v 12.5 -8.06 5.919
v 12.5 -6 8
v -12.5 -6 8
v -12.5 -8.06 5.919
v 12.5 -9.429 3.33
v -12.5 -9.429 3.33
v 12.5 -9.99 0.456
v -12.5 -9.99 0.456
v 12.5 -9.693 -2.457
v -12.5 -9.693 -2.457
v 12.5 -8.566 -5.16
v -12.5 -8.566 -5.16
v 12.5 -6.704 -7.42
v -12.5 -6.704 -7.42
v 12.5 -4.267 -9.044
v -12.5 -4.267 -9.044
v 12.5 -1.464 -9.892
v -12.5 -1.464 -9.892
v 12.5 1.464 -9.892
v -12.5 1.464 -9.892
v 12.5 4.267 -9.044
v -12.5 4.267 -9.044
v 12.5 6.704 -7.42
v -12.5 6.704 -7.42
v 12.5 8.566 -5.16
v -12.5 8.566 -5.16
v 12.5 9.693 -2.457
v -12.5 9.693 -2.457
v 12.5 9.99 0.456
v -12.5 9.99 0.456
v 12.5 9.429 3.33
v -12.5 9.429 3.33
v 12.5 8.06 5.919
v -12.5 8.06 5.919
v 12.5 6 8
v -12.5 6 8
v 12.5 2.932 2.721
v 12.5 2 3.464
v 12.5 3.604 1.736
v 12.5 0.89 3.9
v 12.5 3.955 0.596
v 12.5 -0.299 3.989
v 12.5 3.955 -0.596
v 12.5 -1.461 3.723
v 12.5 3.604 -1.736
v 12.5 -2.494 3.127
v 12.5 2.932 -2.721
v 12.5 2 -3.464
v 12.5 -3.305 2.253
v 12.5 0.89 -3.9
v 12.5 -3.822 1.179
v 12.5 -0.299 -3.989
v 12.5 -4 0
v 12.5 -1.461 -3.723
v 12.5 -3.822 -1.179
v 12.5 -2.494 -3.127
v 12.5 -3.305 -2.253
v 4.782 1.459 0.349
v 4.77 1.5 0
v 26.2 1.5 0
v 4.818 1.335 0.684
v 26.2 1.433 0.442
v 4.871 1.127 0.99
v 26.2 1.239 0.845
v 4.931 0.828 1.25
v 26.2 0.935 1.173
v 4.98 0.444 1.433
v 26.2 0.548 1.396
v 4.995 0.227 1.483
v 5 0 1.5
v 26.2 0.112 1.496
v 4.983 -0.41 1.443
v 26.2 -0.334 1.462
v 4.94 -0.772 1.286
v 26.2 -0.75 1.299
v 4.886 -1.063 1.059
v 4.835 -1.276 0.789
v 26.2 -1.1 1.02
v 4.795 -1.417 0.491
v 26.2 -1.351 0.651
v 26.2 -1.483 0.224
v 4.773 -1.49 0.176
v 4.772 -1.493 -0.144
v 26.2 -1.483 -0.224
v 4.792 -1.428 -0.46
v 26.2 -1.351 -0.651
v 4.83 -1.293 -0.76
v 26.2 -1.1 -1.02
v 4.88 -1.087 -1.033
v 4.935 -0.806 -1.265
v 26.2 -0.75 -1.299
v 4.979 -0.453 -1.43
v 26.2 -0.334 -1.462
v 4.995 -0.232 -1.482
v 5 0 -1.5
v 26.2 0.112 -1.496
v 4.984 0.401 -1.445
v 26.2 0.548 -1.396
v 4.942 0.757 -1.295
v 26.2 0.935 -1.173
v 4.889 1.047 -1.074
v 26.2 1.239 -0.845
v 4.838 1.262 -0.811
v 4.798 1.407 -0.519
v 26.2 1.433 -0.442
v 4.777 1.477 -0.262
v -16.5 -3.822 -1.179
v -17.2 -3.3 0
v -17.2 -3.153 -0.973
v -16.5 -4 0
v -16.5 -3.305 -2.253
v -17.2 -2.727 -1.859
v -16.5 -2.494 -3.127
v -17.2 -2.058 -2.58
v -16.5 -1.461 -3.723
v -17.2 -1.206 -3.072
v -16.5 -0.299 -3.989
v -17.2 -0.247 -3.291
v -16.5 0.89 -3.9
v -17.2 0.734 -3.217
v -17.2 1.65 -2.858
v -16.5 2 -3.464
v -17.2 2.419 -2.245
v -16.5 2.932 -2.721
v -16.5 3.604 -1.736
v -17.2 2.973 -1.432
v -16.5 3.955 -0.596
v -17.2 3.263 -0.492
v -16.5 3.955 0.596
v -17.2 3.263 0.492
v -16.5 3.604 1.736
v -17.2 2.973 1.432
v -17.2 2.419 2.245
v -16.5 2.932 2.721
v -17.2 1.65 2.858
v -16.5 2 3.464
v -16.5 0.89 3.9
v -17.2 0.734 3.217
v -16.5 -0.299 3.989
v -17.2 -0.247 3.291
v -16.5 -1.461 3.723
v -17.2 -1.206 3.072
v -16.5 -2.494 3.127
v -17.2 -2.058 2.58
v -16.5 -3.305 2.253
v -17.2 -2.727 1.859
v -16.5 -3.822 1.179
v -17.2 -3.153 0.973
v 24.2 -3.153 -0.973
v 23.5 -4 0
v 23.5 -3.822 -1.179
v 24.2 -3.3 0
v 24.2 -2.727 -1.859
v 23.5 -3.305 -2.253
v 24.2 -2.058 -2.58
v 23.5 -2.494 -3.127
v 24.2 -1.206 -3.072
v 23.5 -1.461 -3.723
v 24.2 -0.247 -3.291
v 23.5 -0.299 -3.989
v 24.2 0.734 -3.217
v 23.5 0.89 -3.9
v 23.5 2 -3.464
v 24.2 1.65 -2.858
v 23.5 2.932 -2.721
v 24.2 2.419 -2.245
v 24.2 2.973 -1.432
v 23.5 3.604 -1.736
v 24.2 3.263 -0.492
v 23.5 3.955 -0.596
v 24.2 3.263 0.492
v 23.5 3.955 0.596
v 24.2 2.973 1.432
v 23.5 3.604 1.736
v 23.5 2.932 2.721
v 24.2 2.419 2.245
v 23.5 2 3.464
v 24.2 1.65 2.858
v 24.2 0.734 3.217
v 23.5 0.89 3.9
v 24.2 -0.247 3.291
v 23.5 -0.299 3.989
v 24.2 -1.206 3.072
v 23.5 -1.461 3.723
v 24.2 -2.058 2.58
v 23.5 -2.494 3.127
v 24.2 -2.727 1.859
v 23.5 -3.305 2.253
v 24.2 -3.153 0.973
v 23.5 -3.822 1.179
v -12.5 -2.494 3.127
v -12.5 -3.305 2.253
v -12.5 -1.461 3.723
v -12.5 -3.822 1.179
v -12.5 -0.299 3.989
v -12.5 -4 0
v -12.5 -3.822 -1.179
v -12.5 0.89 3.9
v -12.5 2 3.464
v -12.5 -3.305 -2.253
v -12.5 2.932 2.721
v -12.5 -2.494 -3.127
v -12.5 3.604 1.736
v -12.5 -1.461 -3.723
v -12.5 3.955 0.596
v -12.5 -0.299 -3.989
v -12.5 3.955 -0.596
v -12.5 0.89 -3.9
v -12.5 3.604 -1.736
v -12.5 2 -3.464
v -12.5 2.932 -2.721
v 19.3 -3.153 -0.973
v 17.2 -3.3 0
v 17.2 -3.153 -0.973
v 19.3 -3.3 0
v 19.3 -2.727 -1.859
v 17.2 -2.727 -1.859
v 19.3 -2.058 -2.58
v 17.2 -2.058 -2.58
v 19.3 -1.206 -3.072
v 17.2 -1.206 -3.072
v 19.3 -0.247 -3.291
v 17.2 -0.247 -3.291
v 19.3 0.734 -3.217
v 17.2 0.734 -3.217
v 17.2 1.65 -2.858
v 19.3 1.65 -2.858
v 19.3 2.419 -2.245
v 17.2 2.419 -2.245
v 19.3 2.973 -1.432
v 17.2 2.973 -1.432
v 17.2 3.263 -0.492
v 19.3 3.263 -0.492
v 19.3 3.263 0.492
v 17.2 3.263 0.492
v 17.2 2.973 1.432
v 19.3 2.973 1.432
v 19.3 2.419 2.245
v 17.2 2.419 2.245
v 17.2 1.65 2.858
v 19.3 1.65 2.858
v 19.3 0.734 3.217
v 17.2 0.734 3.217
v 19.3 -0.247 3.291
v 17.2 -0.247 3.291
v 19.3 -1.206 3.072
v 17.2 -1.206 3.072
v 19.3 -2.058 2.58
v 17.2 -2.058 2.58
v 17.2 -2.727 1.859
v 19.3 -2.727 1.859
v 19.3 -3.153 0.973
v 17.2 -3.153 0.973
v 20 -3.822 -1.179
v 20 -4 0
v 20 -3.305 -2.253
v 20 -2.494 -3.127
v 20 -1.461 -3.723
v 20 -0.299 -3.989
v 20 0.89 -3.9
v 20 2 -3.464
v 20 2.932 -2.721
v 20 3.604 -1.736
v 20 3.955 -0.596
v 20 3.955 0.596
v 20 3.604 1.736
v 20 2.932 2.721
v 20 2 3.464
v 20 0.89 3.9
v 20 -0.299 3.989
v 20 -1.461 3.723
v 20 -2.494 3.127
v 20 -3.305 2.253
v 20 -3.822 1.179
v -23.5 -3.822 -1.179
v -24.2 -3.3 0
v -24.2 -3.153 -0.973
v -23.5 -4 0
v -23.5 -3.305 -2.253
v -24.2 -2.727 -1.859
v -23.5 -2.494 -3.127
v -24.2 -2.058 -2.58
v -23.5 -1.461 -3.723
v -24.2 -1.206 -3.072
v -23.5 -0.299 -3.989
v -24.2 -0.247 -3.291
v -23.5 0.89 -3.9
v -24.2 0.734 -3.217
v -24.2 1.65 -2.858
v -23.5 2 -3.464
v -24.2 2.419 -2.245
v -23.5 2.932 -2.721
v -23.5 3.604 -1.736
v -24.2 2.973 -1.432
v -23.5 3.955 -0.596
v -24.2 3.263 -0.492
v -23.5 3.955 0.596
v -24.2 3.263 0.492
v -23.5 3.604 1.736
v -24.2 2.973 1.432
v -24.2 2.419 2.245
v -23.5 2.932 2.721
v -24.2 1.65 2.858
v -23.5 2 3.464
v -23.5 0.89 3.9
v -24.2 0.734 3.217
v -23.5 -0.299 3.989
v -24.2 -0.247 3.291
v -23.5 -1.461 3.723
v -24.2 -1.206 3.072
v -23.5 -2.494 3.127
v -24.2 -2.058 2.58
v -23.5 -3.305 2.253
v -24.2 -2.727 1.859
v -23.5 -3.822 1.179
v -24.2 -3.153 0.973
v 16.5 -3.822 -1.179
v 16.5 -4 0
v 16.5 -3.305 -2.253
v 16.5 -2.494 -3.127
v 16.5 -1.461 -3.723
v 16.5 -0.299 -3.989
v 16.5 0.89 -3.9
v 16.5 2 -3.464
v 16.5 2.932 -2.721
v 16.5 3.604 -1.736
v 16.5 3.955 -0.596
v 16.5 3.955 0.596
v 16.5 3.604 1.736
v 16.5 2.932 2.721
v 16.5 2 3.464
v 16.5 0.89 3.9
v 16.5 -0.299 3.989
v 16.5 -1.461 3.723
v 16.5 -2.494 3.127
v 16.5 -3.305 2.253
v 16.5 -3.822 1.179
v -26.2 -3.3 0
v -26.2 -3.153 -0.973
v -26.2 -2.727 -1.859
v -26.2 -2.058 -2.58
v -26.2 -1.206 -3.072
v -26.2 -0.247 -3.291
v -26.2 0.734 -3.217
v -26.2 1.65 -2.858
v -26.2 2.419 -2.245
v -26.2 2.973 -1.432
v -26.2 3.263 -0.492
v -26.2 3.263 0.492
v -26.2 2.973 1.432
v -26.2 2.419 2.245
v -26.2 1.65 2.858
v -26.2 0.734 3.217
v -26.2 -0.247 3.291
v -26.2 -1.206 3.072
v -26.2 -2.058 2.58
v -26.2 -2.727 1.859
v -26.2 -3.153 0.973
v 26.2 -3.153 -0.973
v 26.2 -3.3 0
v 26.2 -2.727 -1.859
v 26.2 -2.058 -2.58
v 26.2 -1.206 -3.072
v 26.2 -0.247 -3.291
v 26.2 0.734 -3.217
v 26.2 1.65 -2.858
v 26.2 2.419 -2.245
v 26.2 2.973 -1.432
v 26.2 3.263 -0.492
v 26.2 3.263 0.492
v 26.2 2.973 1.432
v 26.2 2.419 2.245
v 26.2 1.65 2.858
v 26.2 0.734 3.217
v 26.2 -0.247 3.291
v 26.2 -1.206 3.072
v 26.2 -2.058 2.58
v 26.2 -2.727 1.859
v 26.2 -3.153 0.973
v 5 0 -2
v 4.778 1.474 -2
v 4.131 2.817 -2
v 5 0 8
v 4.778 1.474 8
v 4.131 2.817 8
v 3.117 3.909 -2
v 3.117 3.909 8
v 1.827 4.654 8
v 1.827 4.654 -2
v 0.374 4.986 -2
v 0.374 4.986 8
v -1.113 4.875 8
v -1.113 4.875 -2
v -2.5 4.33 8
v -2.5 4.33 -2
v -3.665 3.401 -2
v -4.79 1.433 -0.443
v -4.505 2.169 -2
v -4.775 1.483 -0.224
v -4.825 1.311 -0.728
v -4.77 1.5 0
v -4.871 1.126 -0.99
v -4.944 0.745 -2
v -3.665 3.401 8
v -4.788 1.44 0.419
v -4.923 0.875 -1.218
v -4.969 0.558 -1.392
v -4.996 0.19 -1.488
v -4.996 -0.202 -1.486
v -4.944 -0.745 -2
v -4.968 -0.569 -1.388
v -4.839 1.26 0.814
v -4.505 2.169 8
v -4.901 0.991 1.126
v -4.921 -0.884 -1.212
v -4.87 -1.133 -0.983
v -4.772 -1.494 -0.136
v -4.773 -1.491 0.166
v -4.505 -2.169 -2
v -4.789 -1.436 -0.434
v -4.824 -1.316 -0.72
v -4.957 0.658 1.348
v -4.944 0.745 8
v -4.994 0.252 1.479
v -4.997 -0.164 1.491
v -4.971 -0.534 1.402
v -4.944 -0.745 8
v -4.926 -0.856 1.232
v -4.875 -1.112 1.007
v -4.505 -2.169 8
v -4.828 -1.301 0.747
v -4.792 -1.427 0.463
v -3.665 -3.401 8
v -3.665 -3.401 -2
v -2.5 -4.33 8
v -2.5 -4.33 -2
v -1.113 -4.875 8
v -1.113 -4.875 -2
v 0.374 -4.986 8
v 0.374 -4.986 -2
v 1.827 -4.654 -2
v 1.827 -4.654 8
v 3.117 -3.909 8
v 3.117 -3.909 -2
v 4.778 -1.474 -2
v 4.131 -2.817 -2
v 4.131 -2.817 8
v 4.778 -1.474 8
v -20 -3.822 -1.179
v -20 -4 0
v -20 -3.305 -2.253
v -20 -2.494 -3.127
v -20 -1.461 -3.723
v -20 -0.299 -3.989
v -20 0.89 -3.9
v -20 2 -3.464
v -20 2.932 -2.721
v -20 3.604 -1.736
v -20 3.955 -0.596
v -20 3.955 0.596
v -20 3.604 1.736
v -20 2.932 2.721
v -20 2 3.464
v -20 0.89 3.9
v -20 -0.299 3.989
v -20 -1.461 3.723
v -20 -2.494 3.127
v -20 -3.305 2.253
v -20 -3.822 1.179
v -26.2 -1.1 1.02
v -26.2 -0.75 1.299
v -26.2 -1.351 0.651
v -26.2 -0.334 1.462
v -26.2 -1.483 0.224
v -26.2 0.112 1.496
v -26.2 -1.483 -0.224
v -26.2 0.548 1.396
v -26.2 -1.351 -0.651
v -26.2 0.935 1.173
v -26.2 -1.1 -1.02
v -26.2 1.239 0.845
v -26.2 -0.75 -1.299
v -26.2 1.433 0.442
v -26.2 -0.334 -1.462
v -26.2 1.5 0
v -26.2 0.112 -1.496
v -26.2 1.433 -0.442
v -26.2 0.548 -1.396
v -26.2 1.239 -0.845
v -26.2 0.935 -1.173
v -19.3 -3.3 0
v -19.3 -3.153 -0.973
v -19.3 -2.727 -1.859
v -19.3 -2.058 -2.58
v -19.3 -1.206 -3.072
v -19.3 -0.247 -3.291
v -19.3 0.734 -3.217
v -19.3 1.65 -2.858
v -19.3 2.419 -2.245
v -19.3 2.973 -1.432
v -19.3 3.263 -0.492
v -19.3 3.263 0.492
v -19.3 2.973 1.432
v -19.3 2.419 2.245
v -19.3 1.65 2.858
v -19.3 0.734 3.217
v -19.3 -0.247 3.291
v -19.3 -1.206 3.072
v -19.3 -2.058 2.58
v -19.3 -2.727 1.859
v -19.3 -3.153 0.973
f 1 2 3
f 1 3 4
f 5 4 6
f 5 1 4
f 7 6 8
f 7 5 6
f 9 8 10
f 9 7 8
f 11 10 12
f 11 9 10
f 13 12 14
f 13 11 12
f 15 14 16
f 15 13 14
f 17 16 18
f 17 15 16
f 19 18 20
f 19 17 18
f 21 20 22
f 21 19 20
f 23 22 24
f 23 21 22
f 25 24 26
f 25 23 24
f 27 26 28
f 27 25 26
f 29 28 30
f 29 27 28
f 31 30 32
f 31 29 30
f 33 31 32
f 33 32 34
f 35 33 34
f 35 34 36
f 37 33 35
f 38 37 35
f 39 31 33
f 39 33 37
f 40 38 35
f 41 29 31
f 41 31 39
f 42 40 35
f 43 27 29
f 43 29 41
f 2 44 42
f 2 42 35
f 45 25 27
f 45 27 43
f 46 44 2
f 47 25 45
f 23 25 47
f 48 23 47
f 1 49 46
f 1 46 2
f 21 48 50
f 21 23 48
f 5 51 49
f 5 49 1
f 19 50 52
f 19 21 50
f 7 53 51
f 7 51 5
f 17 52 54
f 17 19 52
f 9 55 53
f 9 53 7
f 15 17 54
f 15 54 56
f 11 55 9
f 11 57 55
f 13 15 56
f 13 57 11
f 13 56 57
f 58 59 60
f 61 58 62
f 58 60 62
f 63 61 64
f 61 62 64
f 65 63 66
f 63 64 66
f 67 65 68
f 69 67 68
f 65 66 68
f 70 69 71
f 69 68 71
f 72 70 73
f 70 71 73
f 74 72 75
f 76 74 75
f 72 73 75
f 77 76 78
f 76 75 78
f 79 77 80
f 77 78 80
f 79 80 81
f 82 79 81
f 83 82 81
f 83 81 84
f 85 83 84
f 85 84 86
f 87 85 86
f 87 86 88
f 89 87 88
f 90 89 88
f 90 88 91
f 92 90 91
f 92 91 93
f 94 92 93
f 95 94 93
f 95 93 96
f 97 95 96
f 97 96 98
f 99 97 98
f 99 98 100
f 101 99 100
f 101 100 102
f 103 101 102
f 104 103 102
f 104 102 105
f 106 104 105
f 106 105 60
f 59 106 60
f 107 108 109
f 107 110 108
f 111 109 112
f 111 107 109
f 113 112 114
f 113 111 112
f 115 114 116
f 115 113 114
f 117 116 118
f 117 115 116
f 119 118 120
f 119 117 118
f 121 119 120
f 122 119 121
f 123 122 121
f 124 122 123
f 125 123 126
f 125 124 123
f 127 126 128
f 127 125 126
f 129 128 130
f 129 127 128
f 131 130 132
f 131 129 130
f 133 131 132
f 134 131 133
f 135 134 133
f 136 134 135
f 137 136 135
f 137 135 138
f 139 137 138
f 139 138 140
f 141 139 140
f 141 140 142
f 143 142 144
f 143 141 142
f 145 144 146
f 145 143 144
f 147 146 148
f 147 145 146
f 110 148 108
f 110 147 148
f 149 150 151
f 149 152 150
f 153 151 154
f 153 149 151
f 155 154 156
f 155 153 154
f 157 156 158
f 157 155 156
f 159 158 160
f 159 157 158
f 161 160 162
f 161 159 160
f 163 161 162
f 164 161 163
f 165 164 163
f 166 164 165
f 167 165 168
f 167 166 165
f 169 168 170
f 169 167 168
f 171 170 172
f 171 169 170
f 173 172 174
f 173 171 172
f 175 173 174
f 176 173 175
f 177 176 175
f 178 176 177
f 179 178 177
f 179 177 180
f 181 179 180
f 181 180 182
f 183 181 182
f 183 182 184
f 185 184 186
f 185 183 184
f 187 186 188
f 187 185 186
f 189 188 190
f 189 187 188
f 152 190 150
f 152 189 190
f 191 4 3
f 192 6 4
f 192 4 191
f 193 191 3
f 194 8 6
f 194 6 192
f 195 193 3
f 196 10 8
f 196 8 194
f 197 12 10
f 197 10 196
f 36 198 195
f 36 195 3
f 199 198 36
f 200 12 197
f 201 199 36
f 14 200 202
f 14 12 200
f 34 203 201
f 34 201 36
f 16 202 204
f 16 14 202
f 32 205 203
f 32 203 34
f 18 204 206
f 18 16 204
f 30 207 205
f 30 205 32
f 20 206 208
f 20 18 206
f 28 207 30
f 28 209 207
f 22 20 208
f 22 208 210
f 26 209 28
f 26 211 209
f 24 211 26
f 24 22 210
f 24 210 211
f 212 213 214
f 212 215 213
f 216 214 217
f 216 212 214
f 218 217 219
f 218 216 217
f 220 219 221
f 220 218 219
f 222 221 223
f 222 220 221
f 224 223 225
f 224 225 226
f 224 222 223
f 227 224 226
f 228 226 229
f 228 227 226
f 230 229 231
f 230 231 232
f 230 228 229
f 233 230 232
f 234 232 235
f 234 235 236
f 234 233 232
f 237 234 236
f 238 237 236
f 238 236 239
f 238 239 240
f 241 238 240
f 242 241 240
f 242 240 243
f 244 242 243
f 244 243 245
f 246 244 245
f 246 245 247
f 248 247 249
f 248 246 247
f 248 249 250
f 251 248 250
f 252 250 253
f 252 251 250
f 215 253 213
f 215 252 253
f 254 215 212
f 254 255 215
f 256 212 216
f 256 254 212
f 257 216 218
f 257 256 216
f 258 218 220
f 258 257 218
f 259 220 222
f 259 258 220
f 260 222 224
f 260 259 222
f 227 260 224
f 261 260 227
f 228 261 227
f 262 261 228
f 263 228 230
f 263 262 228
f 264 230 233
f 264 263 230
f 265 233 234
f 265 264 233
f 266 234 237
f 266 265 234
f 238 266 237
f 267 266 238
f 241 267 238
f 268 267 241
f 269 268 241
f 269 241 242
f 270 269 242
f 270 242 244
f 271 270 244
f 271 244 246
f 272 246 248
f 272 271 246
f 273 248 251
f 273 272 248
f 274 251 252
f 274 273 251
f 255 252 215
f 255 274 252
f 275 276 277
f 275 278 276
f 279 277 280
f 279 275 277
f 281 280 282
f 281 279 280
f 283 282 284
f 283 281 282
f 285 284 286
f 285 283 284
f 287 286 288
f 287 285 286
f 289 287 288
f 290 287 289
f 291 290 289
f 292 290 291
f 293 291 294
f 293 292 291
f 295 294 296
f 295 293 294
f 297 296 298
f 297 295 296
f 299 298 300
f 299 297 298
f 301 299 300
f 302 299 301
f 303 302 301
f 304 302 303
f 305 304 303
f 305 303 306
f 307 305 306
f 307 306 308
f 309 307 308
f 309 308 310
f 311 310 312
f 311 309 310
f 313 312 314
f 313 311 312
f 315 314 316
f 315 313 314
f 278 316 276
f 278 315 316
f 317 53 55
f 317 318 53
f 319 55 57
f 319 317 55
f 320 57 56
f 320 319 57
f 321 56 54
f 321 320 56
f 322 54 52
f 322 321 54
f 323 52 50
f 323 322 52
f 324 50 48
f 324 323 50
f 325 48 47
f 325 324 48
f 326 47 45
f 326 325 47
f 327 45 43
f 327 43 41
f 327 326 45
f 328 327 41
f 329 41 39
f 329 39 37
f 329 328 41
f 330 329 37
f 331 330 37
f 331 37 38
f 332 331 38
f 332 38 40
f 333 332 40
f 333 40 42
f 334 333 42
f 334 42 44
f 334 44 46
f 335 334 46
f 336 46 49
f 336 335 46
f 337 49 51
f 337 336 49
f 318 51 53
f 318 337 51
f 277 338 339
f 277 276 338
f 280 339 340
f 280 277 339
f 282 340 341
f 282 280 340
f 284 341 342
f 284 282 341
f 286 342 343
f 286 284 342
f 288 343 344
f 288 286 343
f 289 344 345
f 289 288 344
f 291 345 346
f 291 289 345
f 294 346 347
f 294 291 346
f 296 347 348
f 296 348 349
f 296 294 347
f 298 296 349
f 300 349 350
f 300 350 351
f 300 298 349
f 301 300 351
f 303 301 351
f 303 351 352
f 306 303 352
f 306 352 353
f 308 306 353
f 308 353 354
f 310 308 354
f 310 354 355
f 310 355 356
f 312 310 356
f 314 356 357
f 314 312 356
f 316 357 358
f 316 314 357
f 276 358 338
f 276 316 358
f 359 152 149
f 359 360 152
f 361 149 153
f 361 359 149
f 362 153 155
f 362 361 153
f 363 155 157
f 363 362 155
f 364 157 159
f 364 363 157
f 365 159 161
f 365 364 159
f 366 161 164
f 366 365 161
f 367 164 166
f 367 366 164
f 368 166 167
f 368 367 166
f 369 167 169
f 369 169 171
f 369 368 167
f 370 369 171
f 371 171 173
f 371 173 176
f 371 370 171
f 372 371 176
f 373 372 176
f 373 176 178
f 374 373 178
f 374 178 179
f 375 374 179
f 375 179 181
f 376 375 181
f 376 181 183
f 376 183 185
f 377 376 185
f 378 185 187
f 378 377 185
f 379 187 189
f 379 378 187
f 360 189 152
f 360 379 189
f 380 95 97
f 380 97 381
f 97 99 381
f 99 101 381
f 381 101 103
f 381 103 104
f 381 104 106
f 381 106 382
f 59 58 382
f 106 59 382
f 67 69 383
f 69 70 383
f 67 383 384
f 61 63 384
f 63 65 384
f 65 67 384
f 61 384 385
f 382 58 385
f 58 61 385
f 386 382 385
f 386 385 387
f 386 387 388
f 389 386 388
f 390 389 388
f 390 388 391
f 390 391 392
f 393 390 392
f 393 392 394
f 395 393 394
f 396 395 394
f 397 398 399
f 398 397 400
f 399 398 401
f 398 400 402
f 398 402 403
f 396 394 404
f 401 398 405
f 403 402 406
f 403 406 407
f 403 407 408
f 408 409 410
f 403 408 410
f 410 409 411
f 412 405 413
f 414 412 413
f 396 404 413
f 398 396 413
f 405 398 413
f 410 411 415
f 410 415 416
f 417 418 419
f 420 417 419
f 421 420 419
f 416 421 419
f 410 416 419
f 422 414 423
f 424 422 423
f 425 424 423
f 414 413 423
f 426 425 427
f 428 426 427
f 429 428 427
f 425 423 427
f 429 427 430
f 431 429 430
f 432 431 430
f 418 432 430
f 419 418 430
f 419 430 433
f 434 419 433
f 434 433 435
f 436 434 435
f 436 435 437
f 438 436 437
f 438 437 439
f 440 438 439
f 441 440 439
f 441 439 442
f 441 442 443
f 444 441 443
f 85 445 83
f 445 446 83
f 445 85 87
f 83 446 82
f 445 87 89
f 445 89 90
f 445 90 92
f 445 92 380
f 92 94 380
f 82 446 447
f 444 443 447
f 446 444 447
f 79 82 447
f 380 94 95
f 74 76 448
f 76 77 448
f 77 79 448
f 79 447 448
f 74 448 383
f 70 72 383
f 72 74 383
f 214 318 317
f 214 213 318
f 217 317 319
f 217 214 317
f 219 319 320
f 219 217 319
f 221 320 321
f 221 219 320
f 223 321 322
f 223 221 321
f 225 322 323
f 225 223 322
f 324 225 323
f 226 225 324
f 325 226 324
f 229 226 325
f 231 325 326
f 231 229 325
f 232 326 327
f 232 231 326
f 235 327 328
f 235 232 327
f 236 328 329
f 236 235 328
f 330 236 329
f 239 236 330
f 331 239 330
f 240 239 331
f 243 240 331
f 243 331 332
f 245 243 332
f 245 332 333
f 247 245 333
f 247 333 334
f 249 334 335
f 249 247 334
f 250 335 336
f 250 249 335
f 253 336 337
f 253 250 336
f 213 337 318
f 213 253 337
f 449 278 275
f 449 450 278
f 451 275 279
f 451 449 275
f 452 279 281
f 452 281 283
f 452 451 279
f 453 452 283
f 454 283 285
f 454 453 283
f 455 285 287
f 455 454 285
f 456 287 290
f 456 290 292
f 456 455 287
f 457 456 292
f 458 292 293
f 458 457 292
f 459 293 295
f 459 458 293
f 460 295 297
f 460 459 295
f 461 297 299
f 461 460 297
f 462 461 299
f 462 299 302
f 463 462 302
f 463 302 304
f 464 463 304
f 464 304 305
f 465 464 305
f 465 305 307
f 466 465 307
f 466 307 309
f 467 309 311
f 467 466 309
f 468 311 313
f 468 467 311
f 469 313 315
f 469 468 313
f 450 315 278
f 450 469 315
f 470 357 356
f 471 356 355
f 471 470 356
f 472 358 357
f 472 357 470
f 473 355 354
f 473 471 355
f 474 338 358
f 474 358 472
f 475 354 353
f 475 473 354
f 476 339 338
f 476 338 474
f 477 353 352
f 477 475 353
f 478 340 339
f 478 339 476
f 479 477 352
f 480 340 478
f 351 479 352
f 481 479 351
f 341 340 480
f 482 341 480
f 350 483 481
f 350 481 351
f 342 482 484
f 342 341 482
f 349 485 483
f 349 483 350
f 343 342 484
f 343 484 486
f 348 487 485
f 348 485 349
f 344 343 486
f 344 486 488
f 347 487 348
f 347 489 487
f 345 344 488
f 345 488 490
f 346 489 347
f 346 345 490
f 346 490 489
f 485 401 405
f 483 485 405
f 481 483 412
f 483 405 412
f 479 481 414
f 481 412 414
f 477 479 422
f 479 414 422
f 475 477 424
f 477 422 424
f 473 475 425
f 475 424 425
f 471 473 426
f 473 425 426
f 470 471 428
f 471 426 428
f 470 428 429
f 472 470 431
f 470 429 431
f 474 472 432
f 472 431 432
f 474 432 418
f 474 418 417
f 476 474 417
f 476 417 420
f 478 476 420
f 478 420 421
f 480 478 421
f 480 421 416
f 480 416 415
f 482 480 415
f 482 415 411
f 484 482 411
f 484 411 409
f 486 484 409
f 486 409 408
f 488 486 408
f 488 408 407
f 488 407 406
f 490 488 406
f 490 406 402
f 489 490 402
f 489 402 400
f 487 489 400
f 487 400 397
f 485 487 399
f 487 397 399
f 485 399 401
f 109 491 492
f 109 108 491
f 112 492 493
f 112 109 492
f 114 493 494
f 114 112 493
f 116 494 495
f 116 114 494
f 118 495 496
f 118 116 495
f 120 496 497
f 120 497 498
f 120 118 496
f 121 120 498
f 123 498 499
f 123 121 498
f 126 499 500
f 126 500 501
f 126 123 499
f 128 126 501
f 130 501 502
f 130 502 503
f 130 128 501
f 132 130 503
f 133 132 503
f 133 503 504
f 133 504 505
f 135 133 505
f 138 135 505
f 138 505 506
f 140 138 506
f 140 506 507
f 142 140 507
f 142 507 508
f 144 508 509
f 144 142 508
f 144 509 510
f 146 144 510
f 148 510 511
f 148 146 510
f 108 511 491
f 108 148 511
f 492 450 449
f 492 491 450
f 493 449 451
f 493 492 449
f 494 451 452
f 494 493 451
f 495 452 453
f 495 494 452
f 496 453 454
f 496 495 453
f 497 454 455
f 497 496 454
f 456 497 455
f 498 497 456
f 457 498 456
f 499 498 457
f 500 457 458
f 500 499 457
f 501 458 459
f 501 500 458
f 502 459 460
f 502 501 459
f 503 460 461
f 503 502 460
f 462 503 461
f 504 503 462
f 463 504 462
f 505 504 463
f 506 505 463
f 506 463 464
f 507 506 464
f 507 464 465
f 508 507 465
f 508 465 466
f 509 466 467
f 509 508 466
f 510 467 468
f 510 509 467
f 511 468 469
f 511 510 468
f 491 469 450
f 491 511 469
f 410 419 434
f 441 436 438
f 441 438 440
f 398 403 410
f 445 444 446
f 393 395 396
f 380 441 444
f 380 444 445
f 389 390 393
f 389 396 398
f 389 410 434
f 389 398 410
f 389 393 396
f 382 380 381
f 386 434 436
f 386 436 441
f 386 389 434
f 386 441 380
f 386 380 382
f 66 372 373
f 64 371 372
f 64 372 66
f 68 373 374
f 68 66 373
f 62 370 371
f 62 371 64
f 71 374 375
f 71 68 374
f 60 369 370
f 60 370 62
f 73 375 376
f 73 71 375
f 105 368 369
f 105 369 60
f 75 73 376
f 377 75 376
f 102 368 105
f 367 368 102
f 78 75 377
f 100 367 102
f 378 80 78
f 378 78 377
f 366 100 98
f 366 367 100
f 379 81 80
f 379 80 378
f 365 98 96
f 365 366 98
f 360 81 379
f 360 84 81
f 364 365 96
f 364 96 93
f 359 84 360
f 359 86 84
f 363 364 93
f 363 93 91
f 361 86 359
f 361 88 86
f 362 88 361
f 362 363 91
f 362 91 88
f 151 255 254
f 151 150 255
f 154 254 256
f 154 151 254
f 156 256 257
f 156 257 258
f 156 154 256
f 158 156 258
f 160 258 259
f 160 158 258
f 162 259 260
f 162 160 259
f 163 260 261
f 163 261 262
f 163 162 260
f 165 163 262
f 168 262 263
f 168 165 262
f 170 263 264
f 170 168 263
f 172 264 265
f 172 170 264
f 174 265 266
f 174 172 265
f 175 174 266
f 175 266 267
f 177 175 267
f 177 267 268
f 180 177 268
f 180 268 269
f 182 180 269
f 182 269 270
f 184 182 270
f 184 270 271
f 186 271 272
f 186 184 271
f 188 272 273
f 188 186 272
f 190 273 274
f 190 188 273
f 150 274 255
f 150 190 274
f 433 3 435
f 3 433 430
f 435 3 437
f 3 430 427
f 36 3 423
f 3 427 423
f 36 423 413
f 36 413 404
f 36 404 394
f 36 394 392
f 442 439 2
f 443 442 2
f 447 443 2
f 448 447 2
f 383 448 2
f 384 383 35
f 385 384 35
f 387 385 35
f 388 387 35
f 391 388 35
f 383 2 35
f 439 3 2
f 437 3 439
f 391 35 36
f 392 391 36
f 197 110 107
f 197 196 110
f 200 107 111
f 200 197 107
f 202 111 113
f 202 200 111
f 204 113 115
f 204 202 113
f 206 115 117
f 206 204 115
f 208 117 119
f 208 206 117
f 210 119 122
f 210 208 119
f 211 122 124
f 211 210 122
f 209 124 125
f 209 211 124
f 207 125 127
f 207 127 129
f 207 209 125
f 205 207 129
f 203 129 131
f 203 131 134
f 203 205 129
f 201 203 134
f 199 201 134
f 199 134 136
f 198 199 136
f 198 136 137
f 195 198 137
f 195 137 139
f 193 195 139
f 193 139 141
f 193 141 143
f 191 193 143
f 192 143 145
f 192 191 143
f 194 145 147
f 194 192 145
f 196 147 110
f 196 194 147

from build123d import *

# Parameters (mm, degrees)
SKETCH001_R     = 1.5
POCKET_DEPTH    = 52.401
POCKET001_DEPTH = 38.701
SKETCH003_R     = 5
POCKET002_DEPTH = 10


with BuildPart() as part:
    # Sketch → Revolution (revolve)
    with BuildSketch(Plane.XY):
        Polygon((-26.2, -3.3), (-24.2, -3.3), (-23.5, -4), (-20, -4), (-19.3, -3.3), (-17.2, -3.3), (-16.5, -4), (-12.5, -4), (-12.5, -10), (12.5, -10), (12.5, -4), (16.5, -4), (17.2, -3.3), (19.3, -3.3), (20, -4), (23.5, -4), (24.2, -3.3), (26.2, -3.3), (26.2, 0), (-26.2, 0), align=None)
    revolve(axis=Axis((0, 0, 0), (1, 0, 0)))

    # Sketch001 (on Face1 of Revolution) → Pocket (cut, through all)
    with BuildSketch(Plane.YZ.offset(26.2)):
        Circle(SKETCH001_R)
    extrude(amount=-POCKET_DEPTH, mode=Mode.SUBTRACT)

    # Sketch002 (on Face16 of Pocket) → Pocket001 (cut, through all)
    with BuildSketch(Plane.YZ.offset(12.5)):
        with BuildLine():
            ThreePointArc((6, 8), (0, 10), (-6, 8))
            Line((-6, 8), (6, 8))
        make_face()
    extrude(amount=-POCKET001_DEPTH, mode=Mode.SUBTRACT)

    # Sketch003 (on Face19 of Pocket001) → Pocket002 (cut)
    with BuildSketch(Plane.XY.offset(8)):
        Circle(SKETCH003_R)
    extrude(amount=-POCKET002_DEPTH, mode=Mode.SUBTRACT)


solid = part.part
